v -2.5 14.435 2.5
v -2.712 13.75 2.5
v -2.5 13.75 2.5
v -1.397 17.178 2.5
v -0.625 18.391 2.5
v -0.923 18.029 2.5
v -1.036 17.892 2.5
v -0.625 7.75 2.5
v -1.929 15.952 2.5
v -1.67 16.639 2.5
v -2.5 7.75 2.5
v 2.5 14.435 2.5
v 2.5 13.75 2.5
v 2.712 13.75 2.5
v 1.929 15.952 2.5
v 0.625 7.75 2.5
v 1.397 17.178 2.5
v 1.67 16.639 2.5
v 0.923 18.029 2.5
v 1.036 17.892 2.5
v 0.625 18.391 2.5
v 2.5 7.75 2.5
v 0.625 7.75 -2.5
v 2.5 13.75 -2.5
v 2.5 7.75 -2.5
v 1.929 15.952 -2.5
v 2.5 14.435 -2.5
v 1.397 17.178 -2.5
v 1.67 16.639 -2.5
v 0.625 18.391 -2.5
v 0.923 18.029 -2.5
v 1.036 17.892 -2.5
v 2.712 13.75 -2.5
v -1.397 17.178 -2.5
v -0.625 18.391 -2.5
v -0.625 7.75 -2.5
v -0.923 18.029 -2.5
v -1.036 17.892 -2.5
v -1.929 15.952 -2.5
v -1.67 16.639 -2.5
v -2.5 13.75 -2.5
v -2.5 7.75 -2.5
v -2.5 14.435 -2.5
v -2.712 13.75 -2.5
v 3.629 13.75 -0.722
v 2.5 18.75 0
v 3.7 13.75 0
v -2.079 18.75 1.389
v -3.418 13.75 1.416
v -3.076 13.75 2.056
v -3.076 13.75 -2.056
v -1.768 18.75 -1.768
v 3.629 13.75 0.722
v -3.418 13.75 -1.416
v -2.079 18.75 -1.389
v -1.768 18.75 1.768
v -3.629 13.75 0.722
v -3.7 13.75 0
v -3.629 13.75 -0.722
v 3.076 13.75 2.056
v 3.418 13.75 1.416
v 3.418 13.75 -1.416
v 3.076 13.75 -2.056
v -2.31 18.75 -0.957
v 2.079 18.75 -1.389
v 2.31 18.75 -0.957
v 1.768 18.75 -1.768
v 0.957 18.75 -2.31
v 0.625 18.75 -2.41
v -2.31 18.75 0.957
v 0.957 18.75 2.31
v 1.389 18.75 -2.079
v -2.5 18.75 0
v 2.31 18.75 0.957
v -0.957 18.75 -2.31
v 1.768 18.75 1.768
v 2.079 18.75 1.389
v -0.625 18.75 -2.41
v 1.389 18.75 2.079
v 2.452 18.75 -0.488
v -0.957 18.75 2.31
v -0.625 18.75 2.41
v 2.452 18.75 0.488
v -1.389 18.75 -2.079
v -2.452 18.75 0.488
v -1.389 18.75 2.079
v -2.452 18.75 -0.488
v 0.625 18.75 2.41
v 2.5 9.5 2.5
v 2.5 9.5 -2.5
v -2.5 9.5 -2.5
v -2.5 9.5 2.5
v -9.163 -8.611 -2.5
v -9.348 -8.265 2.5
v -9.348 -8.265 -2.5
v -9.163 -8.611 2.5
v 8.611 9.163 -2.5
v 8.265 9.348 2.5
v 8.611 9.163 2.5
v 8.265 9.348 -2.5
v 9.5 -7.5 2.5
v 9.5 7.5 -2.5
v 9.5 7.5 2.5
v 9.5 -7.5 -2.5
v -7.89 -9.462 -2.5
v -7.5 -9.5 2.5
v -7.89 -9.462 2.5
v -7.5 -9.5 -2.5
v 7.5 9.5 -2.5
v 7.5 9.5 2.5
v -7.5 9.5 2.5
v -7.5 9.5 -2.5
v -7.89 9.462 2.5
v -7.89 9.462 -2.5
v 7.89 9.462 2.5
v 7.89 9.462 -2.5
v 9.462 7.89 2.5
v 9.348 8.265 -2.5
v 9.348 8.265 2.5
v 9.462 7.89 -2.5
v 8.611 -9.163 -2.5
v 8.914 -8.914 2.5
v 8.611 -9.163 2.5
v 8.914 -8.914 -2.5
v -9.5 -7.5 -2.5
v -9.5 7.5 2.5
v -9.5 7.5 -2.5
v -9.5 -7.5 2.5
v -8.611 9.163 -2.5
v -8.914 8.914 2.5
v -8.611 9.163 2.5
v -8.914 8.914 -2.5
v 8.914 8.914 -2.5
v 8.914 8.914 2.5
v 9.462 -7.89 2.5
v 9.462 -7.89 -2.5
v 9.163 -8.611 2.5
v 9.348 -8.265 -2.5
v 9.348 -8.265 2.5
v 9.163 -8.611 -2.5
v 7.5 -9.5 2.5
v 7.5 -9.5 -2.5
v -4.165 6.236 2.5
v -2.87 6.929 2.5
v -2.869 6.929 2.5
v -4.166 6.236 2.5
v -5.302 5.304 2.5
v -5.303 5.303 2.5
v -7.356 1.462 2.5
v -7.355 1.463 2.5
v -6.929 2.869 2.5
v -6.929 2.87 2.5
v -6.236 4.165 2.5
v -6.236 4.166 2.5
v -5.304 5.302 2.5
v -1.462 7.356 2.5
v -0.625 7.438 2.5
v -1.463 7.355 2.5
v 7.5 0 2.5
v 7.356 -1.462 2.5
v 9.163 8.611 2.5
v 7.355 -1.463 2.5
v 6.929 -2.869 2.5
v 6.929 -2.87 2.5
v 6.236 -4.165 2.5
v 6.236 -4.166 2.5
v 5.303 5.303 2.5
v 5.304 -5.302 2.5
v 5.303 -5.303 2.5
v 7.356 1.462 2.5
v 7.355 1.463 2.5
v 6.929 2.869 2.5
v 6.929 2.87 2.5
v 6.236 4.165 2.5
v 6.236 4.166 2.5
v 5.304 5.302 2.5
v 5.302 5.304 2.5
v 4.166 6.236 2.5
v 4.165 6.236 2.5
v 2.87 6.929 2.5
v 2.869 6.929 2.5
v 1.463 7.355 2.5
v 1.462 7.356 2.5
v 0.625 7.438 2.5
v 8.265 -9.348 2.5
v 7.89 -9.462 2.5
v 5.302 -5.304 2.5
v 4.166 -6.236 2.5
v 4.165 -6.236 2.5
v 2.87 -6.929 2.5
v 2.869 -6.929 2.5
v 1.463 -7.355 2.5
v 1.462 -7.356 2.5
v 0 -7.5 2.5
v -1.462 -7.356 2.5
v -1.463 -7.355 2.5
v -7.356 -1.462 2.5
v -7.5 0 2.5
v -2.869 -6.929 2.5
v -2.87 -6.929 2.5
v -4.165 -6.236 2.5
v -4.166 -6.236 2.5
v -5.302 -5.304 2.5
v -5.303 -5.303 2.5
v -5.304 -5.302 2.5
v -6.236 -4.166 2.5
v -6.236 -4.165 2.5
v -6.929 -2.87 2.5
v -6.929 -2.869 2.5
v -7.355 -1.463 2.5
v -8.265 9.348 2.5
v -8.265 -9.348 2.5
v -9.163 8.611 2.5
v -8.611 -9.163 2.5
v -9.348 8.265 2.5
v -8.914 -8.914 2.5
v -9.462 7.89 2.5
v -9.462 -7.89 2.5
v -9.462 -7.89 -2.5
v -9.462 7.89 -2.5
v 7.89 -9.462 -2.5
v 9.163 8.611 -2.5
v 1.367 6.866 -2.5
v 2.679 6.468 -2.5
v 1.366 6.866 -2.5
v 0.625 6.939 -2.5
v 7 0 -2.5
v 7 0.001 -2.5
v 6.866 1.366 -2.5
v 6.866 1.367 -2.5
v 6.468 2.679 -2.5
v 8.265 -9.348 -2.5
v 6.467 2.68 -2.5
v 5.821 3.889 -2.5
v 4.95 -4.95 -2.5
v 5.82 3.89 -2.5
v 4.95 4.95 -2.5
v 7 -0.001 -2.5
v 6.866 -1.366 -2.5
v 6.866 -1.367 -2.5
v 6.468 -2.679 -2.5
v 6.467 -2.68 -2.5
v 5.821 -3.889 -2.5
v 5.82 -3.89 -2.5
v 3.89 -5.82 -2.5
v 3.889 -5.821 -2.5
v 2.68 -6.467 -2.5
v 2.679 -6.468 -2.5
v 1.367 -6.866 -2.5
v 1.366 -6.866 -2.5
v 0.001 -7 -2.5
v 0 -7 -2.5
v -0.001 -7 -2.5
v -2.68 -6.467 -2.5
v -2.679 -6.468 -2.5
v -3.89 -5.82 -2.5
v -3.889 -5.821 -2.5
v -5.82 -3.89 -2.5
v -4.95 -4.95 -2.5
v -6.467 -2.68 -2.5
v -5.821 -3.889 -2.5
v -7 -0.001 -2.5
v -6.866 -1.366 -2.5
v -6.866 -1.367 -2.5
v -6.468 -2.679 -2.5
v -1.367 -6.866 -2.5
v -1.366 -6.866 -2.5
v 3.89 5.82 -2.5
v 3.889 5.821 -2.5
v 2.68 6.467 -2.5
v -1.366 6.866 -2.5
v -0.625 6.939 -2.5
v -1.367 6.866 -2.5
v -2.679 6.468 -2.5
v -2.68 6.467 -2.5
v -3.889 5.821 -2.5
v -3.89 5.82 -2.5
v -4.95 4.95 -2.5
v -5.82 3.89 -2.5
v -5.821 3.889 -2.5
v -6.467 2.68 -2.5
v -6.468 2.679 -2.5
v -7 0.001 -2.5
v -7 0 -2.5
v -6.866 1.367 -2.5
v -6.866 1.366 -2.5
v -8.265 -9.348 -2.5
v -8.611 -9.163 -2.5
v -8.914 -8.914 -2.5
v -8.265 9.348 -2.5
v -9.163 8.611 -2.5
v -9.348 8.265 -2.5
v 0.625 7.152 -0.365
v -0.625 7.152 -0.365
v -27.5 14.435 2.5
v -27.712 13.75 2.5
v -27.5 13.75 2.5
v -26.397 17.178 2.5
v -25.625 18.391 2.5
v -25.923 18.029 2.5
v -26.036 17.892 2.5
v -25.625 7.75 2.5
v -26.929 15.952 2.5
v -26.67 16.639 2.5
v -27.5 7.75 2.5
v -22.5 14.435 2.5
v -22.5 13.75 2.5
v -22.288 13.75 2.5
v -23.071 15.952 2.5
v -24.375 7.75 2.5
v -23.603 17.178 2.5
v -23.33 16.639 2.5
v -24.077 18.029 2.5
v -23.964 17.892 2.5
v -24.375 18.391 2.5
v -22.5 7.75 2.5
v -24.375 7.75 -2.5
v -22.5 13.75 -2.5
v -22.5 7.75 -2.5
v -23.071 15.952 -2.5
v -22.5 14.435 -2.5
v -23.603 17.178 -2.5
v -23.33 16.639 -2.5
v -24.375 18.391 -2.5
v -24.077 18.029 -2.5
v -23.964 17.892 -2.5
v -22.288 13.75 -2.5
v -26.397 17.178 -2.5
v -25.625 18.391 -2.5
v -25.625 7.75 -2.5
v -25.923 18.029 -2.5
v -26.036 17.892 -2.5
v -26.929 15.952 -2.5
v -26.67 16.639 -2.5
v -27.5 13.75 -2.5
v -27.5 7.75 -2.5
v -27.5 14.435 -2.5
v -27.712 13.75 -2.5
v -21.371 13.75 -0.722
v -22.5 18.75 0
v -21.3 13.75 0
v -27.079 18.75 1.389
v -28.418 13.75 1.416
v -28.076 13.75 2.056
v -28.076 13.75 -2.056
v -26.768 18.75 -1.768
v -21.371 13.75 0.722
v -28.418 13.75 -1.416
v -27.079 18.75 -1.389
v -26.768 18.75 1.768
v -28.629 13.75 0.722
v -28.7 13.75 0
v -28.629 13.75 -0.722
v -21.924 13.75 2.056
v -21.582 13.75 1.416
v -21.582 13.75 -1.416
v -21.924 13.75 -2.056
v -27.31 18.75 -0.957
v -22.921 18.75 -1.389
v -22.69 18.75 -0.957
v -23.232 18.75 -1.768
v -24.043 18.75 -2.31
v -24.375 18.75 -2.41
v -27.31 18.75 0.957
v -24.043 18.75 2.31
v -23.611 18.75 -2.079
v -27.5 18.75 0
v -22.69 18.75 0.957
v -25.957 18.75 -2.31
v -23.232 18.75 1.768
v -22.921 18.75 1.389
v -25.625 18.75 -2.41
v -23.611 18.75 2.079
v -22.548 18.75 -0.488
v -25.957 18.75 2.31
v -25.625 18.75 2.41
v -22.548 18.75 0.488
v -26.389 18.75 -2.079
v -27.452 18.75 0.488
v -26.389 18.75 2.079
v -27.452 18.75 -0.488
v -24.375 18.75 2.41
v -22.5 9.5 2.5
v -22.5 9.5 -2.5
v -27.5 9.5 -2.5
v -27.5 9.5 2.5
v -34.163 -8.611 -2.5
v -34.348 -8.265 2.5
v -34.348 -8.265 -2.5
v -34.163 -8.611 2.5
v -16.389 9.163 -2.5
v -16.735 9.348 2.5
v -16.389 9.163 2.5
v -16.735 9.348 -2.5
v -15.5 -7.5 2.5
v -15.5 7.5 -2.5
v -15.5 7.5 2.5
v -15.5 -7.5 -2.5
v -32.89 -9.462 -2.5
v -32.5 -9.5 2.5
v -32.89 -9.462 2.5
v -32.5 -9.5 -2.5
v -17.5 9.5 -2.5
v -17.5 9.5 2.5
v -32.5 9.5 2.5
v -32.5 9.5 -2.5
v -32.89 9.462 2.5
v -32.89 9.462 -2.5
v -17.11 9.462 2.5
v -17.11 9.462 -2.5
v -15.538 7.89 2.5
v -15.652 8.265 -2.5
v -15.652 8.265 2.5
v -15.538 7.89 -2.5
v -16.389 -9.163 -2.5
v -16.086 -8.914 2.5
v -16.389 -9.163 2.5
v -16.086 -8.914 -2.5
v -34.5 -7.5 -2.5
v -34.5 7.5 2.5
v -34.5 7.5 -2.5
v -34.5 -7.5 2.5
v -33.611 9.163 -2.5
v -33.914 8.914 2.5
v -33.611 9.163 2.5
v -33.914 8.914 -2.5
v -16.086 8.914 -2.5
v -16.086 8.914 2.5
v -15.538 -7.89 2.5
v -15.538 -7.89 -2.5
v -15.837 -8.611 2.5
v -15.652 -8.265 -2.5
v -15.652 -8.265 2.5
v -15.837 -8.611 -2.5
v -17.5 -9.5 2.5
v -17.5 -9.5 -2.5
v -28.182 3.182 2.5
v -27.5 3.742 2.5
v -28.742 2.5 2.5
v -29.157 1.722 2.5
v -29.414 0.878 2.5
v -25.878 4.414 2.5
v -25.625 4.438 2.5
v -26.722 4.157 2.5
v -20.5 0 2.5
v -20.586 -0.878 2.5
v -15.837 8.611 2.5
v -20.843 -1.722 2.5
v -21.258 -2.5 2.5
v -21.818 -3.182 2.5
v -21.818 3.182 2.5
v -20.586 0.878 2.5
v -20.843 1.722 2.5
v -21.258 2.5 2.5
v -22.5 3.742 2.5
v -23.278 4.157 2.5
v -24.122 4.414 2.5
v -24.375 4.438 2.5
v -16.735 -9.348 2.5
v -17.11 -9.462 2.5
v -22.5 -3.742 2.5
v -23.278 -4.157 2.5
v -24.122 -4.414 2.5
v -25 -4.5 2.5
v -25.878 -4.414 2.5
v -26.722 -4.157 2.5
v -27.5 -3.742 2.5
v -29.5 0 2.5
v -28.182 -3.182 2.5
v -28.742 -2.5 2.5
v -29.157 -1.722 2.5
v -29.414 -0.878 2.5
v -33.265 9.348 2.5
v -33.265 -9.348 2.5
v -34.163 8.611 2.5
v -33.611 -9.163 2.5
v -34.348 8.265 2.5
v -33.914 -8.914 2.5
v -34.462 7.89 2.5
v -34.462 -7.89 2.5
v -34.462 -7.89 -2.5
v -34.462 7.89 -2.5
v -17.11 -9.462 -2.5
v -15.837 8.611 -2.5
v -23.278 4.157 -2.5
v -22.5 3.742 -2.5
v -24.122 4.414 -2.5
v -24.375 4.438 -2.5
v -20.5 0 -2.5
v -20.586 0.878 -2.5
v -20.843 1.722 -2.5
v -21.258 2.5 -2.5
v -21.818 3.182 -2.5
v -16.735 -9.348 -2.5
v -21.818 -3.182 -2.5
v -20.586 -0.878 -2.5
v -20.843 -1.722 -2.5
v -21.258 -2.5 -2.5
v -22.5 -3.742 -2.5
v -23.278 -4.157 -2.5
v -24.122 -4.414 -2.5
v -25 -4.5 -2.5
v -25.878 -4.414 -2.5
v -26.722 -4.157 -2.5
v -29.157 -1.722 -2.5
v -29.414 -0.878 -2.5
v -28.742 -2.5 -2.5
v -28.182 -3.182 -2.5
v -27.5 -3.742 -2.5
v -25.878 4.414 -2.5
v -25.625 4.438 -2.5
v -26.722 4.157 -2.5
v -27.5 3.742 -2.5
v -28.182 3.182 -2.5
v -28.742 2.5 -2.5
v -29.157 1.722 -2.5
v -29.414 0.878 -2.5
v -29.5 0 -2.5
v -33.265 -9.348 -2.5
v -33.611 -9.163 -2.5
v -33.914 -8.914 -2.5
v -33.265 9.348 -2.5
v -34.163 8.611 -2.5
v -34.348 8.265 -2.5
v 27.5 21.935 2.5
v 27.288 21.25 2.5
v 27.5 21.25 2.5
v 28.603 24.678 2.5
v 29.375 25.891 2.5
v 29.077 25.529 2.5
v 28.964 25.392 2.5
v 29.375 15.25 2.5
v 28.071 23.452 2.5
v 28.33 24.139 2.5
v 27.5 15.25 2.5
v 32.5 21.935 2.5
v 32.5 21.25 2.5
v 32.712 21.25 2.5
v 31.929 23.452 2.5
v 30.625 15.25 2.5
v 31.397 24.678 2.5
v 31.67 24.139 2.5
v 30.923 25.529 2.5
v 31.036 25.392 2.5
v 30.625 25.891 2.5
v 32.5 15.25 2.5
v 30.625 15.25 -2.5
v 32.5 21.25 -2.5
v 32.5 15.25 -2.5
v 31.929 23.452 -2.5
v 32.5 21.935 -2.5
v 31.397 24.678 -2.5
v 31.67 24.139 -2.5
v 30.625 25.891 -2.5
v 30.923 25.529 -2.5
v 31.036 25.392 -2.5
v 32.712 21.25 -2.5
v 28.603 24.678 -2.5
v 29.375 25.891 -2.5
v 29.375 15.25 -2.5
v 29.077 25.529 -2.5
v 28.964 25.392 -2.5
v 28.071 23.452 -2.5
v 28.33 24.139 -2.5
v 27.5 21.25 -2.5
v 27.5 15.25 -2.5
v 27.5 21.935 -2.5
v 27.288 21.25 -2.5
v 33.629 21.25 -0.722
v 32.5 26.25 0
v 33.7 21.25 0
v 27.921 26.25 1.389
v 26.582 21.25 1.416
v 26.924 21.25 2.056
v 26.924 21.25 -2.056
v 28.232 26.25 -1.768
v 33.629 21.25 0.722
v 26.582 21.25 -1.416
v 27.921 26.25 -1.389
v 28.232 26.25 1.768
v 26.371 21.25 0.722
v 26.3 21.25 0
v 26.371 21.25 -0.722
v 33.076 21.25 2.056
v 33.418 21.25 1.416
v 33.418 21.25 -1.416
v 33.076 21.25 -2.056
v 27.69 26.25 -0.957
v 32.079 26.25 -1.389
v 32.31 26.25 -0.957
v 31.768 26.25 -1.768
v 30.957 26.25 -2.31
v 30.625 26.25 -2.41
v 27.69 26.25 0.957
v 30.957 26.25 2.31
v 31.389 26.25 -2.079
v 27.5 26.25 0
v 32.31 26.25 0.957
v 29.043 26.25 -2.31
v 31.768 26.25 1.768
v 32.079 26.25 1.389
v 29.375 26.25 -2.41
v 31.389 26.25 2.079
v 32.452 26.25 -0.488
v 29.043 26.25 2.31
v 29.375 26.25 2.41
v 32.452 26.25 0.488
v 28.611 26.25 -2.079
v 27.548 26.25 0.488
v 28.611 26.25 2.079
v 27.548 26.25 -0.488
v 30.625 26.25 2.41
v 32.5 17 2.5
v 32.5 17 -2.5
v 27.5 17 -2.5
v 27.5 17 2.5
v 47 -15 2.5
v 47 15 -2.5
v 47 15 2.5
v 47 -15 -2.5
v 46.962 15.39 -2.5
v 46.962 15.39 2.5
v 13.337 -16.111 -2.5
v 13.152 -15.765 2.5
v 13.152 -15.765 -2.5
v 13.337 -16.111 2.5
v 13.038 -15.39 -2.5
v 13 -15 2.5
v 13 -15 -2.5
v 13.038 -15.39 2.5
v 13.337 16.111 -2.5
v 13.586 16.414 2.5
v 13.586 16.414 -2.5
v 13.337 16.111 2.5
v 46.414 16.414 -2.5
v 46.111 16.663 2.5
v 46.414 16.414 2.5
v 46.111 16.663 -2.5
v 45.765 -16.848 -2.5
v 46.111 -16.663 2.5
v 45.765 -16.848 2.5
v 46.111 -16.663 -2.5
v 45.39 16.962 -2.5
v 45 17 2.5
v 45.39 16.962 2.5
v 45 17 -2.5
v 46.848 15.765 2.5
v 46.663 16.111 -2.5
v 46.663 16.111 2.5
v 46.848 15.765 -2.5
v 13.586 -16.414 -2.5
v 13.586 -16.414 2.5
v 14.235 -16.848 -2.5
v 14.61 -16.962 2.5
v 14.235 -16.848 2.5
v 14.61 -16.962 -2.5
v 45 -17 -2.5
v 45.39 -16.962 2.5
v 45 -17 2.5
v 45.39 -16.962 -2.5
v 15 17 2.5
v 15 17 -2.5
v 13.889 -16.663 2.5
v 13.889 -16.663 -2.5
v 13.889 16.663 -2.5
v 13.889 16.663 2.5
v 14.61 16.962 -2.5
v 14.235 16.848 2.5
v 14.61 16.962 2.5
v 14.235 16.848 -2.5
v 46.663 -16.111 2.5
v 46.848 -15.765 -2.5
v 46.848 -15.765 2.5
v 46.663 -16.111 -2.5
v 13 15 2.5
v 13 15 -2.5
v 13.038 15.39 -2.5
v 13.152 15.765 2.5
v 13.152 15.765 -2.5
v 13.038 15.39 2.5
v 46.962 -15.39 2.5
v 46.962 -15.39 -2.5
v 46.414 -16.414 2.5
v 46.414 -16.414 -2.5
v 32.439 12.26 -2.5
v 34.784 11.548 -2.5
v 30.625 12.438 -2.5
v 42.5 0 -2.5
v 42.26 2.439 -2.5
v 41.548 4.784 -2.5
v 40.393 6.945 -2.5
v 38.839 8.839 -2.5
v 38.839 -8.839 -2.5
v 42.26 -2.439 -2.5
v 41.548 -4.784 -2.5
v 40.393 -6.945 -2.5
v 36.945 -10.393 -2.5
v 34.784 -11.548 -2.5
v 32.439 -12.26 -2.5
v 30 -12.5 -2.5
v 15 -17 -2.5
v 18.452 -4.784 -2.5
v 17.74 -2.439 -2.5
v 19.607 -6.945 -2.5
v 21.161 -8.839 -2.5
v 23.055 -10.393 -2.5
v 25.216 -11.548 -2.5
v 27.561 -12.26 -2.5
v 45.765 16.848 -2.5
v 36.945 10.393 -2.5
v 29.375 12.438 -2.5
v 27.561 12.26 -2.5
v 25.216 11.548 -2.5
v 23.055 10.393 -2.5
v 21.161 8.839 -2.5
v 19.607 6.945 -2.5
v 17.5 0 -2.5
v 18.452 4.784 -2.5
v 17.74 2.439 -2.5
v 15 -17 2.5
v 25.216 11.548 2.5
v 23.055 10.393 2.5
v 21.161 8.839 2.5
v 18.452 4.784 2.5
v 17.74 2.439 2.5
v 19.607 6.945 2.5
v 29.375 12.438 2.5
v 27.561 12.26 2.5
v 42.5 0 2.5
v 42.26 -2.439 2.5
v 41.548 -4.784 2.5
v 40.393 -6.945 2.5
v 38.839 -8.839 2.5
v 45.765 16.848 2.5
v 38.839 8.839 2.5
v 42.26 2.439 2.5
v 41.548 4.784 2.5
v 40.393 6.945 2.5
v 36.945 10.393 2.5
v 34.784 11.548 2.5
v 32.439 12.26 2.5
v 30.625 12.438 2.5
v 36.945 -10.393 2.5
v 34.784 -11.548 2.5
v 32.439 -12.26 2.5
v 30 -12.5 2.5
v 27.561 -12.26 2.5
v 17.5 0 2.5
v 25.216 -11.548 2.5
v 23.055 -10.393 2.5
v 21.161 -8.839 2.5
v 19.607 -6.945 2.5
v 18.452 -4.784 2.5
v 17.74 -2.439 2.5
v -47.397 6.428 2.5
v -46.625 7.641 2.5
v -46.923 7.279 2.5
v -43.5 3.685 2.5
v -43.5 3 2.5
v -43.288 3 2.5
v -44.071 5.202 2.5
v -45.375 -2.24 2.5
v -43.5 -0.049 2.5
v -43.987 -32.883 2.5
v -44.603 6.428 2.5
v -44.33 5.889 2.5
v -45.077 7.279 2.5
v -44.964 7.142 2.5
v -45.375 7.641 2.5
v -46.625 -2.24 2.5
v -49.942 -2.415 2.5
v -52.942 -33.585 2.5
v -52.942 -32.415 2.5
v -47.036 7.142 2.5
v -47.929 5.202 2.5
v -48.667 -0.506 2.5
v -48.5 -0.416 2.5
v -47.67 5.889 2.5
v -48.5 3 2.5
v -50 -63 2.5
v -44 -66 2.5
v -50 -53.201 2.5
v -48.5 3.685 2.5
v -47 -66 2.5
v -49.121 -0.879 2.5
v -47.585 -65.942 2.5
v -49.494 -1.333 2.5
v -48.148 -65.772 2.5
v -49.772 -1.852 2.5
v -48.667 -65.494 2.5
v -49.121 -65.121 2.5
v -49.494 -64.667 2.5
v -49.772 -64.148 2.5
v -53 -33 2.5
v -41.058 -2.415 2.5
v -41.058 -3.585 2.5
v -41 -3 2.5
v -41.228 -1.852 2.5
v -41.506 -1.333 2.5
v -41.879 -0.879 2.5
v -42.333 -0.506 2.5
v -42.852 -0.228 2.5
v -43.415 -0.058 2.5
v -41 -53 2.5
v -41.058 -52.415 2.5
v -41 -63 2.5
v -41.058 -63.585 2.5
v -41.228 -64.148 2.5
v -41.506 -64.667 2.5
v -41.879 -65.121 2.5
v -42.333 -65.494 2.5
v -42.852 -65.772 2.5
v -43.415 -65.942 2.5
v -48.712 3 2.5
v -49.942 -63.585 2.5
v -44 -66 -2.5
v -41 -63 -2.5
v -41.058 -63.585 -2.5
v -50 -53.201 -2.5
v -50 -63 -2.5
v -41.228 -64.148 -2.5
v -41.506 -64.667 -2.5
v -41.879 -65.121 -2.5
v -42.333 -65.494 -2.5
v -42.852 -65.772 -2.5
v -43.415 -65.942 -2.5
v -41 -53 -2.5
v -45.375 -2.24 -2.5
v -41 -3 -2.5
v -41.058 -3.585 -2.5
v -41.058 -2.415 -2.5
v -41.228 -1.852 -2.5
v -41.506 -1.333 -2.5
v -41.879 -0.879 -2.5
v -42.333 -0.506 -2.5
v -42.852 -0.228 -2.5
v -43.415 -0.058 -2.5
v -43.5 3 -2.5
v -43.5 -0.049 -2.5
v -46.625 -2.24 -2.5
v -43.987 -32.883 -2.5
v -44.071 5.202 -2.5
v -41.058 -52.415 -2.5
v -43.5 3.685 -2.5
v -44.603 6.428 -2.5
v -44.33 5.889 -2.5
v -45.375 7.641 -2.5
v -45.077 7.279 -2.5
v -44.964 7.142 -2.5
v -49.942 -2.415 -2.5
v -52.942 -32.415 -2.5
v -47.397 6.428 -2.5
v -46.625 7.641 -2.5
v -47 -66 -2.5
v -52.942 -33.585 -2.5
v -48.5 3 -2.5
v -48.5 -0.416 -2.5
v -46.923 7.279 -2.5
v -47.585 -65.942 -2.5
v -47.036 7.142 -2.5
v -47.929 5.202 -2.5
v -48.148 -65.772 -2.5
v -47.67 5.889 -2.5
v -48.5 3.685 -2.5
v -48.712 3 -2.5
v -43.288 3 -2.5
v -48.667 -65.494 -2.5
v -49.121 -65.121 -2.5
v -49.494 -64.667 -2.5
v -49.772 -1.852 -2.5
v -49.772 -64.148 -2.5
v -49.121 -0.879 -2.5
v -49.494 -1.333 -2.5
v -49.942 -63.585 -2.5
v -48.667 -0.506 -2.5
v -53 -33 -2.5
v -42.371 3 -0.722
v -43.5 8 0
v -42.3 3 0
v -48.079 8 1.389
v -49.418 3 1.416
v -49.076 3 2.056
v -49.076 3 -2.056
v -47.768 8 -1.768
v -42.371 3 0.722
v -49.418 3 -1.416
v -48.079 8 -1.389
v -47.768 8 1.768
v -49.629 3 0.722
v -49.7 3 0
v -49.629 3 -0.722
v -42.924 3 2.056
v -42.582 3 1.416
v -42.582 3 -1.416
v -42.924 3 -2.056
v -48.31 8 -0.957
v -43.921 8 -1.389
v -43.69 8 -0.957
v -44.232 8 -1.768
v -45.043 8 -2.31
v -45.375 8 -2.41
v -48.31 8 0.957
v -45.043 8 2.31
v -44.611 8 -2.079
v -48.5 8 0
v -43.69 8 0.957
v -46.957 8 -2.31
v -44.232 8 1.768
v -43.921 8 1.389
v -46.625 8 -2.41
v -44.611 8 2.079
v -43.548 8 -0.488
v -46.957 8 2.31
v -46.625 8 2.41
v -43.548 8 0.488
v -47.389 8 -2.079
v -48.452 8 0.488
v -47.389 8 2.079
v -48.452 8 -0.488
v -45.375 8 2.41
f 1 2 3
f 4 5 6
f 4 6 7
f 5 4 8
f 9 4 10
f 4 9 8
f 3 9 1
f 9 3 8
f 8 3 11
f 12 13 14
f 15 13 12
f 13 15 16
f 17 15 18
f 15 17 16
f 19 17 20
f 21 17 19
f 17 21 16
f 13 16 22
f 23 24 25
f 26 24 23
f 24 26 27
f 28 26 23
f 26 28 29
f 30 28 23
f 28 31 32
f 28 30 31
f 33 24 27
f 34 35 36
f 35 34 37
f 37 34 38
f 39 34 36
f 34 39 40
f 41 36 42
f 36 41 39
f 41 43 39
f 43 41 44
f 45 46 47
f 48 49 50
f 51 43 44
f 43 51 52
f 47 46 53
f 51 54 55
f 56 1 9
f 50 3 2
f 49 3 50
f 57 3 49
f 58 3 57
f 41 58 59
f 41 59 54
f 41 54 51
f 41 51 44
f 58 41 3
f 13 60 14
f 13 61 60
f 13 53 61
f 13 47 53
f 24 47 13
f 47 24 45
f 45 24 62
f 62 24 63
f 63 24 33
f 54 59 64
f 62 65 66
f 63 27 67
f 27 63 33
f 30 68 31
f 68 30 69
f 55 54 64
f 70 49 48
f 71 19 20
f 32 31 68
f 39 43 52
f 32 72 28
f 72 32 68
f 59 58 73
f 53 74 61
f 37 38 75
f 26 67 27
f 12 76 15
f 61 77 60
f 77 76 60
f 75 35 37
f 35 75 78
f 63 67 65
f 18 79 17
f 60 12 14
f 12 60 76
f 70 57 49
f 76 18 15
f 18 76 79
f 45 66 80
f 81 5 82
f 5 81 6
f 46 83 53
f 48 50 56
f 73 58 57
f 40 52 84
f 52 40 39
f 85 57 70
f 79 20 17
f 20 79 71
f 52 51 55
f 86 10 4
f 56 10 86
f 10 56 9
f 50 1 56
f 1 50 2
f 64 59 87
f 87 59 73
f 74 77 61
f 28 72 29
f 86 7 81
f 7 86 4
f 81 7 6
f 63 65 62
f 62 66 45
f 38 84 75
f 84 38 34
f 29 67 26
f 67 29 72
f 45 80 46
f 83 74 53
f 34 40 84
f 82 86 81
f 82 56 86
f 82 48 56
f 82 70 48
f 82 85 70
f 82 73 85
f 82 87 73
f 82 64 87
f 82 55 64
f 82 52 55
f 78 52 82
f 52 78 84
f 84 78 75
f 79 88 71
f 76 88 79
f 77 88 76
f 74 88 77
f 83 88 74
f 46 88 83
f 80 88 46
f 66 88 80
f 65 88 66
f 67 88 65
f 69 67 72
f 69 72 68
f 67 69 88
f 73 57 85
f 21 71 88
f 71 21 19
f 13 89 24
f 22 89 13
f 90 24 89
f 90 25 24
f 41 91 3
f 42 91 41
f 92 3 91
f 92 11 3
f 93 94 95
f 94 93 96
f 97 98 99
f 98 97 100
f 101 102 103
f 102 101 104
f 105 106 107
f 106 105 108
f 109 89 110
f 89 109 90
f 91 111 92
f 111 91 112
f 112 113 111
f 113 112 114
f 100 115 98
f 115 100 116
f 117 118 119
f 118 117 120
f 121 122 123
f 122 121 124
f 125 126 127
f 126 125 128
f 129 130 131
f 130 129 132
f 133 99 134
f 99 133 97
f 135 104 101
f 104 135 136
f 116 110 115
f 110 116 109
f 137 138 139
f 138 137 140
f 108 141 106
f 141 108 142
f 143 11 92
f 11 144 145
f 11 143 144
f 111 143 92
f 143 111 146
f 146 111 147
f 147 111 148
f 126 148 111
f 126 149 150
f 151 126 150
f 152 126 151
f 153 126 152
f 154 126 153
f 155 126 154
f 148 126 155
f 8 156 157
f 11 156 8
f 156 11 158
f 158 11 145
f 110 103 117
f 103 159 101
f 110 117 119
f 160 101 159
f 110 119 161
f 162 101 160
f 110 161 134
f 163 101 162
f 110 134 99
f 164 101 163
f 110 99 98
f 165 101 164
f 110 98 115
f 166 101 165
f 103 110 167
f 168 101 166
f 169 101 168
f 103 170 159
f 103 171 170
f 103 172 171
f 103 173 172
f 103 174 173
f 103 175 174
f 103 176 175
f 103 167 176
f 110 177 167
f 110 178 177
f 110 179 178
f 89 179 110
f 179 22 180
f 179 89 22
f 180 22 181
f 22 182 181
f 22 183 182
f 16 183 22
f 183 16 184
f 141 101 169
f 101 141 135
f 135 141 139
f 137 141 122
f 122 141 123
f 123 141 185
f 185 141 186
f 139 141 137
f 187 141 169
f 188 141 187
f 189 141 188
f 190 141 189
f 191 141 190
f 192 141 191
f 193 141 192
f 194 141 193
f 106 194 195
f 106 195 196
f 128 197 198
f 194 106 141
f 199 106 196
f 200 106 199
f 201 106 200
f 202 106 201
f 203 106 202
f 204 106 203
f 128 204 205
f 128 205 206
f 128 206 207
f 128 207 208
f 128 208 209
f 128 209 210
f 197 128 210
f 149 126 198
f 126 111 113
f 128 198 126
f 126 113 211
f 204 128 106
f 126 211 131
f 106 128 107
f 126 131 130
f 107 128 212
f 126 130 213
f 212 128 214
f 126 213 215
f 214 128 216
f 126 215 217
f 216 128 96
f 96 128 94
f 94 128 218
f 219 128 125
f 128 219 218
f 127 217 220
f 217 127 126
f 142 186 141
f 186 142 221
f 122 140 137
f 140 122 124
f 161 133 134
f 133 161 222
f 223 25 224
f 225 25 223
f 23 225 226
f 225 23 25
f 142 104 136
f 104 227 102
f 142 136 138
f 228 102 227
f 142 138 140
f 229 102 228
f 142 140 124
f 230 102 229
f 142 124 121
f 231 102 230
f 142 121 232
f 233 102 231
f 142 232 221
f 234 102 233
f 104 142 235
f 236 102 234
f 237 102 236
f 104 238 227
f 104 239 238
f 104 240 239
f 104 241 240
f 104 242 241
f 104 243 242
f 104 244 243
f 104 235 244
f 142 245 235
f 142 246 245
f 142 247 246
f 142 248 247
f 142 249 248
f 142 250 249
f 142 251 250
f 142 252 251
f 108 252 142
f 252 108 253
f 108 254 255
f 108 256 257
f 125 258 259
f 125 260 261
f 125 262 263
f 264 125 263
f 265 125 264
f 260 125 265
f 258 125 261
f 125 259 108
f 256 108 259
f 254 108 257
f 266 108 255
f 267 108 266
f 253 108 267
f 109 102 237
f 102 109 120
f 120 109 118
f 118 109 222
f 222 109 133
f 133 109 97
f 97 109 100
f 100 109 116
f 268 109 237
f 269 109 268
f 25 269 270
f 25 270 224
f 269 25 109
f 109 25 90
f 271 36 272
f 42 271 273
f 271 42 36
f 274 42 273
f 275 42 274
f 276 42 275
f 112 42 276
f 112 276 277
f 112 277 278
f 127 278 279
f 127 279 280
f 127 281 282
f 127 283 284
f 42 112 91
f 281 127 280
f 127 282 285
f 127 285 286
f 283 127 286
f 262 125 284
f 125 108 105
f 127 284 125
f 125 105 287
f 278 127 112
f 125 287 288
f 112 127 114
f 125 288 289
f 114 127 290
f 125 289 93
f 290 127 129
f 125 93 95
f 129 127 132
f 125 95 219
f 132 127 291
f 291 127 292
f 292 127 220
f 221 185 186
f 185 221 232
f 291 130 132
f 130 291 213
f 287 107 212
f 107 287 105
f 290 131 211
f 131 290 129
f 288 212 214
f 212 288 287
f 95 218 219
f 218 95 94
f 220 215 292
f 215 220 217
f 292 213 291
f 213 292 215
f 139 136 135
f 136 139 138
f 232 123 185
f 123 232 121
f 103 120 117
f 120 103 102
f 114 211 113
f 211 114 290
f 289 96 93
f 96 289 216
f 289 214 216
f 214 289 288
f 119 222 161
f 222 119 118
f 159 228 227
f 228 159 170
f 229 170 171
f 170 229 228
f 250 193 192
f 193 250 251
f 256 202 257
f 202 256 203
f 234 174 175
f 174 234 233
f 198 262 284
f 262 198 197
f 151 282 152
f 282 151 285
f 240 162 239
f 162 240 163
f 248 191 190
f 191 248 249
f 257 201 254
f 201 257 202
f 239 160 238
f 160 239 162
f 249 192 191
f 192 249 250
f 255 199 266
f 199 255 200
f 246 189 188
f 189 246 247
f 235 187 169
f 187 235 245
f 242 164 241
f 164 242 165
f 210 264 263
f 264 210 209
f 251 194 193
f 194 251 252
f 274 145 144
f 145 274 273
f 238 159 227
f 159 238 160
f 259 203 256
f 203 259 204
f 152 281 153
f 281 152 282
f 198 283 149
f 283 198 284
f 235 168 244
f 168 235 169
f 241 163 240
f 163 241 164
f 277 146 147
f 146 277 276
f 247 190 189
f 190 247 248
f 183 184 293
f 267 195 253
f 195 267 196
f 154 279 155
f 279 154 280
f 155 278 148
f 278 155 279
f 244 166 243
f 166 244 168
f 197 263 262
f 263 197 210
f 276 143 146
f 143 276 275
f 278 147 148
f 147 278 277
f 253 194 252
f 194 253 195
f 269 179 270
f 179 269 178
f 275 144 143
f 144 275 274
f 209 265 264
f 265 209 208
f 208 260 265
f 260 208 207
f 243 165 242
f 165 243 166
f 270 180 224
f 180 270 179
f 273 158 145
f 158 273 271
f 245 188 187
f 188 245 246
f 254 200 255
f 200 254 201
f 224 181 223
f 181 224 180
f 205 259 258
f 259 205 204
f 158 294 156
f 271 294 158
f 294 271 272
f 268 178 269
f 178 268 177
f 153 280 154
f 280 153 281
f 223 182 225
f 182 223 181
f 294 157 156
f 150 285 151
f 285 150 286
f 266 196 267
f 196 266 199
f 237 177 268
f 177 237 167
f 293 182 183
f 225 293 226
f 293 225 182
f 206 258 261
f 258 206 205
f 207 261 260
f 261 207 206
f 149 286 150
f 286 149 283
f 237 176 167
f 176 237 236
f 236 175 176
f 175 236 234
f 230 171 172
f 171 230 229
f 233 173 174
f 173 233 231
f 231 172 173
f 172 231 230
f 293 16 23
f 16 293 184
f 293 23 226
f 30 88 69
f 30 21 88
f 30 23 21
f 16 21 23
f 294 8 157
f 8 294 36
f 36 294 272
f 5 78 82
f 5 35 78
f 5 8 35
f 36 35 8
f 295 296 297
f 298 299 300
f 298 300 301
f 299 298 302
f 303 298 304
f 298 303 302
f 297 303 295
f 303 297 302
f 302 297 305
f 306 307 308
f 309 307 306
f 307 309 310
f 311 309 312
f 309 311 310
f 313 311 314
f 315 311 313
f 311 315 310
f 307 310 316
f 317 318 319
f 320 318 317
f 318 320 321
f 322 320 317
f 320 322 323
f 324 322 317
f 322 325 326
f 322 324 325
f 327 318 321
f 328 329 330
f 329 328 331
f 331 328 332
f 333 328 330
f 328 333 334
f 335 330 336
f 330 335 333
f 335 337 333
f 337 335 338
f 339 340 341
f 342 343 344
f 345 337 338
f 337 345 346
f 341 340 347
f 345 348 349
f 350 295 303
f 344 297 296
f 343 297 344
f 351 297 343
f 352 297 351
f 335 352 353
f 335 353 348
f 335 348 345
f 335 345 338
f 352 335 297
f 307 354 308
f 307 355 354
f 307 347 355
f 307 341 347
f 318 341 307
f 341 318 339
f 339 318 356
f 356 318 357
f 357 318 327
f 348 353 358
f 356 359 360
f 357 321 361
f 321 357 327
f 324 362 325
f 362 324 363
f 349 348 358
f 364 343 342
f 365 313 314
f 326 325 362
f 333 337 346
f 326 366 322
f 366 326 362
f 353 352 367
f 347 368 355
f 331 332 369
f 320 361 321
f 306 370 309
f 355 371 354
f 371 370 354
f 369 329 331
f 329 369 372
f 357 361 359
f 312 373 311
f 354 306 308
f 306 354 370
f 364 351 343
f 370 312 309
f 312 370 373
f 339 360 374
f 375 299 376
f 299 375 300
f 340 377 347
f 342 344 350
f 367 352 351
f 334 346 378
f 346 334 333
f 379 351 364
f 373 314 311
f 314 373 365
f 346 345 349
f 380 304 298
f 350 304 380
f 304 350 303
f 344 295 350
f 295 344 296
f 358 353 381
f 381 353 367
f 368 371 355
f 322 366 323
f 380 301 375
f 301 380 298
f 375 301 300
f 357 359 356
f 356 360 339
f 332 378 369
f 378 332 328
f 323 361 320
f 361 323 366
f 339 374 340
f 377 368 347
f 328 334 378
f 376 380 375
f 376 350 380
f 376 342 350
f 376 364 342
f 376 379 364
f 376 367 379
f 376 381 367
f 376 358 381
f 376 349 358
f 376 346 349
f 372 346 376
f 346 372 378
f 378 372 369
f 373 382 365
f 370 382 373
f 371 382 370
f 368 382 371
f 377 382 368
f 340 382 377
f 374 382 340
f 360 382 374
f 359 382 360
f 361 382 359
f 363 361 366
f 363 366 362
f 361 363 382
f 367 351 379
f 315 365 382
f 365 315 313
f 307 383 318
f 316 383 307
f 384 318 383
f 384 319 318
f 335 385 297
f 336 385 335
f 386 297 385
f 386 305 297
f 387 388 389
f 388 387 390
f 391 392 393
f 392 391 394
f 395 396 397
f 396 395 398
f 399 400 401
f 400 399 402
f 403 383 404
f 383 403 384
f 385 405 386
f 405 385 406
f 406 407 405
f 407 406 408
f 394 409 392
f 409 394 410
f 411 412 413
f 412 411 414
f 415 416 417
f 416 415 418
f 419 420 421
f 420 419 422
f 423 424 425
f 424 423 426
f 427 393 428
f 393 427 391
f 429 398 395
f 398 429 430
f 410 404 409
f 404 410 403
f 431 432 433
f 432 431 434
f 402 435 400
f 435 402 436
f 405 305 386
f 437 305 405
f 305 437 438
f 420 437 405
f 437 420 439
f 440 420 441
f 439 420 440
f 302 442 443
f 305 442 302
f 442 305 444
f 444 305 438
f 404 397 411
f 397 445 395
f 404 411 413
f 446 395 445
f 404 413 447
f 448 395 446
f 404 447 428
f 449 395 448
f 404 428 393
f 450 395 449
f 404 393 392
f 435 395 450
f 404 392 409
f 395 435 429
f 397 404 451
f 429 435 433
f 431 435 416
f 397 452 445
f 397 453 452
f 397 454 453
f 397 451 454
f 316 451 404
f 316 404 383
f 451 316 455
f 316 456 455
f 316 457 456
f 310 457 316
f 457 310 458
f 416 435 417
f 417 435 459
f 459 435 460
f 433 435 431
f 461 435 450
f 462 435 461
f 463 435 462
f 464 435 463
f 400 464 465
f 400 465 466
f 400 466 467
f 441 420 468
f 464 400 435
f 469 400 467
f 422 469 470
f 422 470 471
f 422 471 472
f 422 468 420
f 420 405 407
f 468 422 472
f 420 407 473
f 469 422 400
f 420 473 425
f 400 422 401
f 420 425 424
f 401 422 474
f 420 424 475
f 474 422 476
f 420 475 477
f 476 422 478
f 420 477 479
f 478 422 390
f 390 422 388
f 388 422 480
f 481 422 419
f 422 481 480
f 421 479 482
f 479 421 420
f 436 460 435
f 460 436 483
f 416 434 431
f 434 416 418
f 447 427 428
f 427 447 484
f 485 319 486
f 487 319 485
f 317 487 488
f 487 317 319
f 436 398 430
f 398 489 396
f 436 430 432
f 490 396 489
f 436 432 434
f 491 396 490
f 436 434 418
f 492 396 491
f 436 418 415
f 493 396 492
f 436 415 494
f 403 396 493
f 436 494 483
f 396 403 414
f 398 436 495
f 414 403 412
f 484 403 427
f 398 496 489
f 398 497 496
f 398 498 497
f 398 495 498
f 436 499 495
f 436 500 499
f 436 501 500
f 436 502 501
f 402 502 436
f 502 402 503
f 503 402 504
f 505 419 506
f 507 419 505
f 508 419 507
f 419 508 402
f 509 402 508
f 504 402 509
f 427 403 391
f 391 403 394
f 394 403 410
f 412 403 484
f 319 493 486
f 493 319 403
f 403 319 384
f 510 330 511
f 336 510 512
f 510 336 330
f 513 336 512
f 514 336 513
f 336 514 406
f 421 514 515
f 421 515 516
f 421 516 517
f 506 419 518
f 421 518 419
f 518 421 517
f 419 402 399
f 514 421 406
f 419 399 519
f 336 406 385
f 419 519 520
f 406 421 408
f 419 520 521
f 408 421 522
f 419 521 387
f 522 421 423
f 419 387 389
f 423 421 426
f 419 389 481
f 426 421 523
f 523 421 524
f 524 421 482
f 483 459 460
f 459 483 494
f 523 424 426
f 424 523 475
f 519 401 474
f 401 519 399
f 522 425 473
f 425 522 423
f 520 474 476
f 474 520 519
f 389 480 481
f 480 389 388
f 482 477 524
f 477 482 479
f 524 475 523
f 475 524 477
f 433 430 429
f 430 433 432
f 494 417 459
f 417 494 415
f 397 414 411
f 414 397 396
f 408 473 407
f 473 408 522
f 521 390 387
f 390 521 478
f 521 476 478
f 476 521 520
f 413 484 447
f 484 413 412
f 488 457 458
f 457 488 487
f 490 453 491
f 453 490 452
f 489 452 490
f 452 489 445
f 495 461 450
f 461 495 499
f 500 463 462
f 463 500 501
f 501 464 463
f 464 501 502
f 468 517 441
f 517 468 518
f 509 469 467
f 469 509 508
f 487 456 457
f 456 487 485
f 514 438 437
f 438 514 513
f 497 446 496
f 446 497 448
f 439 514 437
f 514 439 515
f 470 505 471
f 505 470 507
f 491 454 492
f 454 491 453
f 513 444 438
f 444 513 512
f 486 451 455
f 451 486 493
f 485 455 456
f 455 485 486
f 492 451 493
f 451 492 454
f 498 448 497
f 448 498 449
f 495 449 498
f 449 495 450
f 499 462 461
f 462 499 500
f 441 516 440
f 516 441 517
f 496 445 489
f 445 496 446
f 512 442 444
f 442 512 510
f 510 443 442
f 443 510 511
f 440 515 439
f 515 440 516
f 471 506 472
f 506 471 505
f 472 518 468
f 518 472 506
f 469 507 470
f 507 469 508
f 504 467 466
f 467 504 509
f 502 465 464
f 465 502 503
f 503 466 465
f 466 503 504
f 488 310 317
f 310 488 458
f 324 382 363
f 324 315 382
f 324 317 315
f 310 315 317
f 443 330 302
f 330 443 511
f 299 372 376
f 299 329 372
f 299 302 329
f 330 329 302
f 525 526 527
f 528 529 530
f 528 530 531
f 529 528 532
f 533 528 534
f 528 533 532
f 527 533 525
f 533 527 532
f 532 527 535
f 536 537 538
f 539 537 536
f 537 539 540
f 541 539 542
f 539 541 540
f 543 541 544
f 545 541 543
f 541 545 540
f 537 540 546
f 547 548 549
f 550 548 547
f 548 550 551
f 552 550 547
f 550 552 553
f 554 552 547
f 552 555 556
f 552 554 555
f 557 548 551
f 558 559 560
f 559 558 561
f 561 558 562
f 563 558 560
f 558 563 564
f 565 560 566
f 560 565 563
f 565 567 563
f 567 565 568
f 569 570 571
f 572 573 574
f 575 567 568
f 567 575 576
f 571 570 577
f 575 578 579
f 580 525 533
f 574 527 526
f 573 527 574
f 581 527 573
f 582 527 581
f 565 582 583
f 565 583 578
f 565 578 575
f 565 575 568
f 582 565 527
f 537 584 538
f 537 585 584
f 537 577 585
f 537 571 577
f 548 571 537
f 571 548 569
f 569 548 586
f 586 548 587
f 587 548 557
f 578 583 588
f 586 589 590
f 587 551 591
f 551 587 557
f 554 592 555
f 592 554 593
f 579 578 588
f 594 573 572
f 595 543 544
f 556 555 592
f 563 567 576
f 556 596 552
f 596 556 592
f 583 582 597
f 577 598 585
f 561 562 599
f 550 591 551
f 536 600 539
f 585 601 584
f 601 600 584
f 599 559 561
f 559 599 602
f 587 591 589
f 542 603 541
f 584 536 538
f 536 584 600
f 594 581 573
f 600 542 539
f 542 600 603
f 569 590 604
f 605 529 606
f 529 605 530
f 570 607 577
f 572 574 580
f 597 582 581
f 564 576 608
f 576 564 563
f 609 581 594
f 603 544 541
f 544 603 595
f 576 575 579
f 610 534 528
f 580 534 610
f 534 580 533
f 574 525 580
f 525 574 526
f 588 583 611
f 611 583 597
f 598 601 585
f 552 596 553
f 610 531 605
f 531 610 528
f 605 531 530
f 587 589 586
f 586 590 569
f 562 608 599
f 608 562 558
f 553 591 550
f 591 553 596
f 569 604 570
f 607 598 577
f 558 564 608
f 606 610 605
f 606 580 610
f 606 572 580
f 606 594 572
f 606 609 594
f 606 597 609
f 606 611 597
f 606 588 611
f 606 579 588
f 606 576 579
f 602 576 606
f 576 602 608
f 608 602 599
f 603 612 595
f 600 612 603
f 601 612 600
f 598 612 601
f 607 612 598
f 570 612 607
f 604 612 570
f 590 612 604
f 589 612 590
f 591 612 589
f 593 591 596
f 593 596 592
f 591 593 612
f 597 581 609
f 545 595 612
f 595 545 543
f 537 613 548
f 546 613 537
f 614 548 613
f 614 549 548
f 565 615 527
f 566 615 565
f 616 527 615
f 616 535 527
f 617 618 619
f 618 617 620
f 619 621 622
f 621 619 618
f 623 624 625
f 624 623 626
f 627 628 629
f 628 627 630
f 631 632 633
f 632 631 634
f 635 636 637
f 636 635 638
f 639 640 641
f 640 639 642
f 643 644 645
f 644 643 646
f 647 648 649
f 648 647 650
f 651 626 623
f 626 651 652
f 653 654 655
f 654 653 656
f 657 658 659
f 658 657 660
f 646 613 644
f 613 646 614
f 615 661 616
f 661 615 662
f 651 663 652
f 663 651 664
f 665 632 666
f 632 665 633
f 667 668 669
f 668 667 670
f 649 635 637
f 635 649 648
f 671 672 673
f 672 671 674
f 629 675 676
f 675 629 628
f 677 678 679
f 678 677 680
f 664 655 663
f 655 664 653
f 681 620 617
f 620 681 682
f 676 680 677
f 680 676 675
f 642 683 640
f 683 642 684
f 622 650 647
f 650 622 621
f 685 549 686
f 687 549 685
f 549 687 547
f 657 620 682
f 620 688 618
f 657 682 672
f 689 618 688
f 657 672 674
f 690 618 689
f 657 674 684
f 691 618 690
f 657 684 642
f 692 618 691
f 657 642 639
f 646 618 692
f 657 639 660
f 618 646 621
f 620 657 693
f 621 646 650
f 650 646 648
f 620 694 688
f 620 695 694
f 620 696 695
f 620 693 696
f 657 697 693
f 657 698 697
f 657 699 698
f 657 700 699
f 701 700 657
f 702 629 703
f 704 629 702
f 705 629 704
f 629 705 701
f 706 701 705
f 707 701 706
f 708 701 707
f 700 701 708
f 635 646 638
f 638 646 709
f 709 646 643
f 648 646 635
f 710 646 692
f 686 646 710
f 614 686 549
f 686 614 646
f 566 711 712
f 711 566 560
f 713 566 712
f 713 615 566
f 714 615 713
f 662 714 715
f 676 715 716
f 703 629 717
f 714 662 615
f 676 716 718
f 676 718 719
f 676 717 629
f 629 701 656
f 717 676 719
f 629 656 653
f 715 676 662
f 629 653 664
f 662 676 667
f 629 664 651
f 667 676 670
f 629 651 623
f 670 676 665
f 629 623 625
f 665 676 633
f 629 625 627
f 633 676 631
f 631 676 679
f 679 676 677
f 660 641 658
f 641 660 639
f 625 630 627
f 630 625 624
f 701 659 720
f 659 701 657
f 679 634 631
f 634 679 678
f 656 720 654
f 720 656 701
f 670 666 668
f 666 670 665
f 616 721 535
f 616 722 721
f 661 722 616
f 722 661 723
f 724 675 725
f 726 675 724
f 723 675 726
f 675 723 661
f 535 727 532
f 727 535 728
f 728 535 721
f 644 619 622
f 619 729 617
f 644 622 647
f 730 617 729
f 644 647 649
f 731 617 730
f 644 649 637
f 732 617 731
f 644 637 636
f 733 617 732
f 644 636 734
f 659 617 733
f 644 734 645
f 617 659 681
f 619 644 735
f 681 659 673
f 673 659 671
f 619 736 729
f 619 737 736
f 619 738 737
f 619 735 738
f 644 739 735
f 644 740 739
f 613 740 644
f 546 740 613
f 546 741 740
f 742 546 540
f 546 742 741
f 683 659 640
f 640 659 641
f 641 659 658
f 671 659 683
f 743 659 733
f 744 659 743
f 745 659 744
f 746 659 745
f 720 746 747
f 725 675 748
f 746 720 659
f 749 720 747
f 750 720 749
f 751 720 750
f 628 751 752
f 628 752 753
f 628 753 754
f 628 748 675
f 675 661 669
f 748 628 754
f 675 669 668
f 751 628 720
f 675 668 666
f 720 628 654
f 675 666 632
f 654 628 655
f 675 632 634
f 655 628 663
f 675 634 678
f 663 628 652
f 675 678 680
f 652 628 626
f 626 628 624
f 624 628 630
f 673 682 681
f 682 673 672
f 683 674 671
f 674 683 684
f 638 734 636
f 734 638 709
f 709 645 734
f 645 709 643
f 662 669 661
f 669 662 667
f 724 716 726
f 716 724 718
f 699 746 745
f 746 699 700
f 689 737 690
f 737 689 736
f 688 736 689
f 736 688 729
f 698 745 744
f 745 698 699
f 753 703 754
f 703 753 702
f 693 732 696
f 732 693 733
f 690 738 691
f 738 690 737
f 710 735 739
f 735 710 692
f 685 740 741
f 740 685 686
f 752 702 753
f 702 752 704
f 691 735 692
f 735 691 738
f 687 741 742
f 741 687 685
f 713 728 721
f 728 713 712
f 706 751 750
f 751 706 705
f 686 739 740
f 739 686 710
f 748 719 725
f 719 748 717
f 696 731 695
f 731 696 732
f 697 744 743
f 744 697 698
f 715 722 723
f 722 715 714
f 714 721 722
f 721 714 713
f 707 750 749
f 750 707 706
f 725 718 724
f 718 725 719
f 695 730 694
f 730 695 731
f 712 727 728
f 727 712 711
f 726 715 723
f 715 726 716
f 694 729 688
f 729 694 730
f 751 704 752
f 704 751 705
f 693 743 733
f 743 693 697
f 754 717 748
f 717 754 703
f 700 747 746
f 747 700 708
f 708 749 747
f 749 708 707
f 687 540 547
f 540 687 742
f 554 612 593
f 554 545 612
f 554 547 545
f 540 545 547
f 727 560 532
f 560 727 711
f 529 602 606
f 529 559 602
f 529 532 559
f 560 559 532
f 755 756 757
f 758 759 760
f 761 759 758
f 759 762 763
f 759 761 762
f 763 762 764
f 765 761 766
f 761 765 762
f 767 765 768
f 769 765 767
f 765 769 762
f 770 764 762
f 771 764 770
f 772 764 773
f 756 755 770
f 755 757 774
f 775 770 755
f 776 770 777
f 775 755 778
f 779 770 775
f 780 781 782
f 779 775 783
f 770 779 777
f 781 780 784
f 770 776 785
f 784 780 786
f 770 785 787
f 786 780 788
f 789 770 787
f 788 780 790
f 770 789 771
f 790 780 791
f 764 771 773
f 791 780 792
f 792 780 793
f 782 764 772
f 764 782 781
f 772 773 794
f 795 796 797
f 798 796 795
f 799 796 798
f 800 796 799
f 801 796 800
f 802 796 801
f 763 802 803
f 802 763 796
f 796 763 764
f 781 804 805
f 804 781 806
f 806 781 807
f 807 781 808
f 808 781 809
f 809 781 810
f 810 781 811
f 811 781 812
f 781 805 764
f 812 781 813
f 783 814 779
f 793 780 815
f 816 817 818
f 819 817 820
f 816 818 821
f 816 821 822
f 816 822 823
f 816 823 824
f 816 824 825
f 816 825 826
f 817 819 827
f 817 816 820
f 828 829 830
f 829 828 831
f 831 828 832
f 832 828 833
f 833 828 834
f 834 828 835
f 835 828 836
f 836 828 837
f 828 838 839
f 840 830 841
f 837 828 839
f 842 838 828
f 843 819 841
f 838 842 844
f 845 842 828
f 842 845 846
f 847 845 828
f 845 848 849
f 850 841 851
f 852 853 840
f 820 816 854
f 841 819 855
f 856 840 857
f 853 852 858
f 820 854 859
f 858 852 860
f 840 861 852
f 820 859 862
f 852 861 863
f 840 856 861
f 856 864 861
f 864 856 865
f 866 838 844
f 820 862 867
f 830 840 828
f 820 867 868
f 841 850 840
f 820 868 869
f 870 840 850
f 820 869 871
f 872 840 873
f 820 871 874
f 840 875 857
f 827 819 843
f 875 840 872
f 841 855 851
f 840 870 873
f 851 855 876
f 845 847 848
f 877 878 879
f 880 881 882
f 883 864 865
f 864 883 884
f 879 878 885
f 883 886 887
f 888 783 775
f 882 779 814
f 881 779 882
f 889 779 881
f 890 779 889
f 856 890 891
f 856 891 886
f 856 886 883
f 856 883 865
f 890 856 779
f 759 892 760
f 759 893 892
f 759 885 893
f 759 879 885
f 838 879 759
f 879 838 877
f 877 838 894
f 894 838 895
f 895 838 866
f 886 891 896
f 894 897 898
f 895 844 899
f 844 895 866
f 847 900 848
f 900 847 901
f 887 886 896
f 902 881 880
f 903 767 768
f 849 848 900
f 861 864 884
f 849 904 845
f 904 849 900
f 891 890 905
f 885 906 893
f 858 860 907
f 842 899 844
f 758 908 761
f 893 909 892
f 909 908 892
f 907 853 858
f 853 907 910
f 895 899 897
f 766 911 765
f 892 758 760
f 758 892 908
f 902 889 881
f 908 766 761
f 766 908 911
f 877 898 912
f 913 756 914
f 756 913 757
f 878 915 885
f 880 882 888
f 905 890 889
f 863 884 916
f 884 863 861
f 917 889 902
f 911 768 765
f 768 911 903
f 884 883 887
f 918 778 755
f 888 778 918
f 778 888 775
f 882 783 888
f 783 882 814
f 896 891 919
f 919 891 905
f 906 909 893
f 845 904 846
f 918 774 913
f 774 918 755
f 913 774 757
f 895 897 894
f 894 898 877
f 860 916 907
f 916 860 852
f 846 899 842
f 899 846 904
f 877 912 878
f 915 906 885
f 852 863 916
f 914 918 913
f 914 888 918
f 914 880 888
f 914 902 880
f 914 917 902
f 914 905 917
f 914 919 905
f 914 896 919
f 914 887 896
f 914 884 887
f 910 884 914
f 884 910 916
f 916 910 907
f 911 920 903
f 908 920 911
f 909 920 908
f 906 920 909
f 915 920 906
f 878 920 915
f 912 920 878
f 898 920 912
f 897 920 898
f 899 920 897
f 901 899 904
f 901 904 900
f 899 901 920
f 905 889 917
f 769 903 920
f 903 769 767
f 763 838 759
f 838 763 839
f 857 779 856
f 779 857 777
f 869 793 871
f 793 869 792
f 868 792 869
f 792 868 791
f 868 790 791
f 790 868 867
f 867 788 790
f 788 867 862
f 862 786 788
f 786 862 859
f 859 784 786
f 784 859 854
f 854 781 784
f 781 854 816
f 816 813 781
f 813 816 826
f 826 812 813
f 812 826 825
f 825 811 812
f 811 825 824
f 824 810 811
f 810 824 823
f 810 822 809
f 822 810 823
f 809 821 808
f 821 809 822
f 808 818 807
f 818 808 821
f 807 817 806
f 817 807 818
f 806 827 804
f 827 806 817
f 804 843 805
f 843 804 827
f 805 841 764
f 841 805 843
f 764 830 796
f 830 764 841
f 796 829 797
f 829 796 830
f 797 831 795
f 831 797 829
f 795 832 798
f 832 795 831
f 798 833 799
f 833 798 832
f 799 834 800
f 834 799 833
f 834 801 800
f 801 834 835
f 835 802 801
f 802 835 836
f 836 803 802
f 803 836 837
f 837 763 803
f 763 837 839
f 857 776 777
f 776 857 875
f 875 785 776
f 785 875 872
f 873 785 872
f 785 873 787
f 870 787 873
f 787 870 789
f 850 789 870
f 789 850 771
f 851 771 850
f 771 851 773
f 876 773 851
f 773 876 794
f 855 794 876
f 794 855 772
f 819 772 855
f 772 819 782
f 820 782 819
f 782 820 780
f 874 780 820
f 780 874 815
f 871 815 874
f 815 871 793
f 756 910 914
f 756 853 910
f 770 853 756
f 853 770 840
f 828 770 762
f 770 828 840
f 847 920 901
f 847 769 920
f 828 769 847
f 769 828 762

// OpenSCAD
// file: config.scad
pad = 0.01;
smooth = 32;

$fn = smooth;

peg_gap = 1.25;
peg_length = 6;
// file: peg.scad
include <config.scad>

module peg(l)
{
	difference(){
		union(){
			cube([5, l, 5], center = true);
			intersection()
			{
				cube([12, 40, 5], center = true);
				translate([0, 5/2+l/2, 0])
					rotate([-90, 0, 0])
						cylinder(r1 = 7.4/2, r2 = 5/2, h = 5, center = true);
			}
		}
		*translate([0, 2, 0])
			cube([1.25, l*2.5, 5 + pad], center = true);
	}
}
// file: hook.scad
use <peg.scad>
include <config.scad>

module hook(w=20, h=5)
{
	mink_r = 3;

	difference()
	{
		union(){
			translate([mink_r, mink_r, -h/2])
				linear_extrude(height=h)
					minkowski(){
						polygon(
								points=[[0,0],[30,-w],[50,0],[60,0],
										[60,w],[50,w],[30,0],[0,w]],
								paths=[[0,1,2,3,4,5,6,7]]);
						circle(r=mink_r);
					}

			translate([0, (h + mink_r)/2,0])
				rotate([0,0,90])
					peg(peg_length);
		}

		#rotate([0,0,90])
			translate([(h + mink_r)/2, w/2 + peg_length/2 + pad, 0])
				cube([peg_gap, w * 2.5 + peg_length, h+pad], center = true);
	}
}
// file: tool_loop.scad
use <peg.scad>
include <config.scad>

module tool_loop(r1=9, r2=10, w=20, h=5) {
	difference(){
		union(){
			minkowski(){
				cube([w, w, h-pad], center = true);
				translate([0, 0, 0])cylinder(r=2, h=pad, center = true);
			}
			translate([0, w/2 + peg_length/2 + 0.25, 0])
				peg(peg_length);
		}
		cylinder(h=h+pad, r1=r1, r2=r2, center = true);
		translate([0, (w + peg_length)/2, 0])
			cube([peg_gap, w + peg_length, h+pad], center = true);
	}
}
// main file
use <tool_loop.scad>
use <hook.scad>

// small_tool
translate([0, 0 ,0]) tool_loop(r1=7, r2=7.5, w=15);

// tiny_tool
translate([-25, 0 ,0]) tool_loop(r1=4.5, r2=4.5, w=15);

// large_tool
translate([30, 0, 0]) tool_loop(r1=12.5, r2=12.5, w=30);

// hook
translate([-50,0,0]) rotate([0,0,-90]) hook(w=3, h=5);
